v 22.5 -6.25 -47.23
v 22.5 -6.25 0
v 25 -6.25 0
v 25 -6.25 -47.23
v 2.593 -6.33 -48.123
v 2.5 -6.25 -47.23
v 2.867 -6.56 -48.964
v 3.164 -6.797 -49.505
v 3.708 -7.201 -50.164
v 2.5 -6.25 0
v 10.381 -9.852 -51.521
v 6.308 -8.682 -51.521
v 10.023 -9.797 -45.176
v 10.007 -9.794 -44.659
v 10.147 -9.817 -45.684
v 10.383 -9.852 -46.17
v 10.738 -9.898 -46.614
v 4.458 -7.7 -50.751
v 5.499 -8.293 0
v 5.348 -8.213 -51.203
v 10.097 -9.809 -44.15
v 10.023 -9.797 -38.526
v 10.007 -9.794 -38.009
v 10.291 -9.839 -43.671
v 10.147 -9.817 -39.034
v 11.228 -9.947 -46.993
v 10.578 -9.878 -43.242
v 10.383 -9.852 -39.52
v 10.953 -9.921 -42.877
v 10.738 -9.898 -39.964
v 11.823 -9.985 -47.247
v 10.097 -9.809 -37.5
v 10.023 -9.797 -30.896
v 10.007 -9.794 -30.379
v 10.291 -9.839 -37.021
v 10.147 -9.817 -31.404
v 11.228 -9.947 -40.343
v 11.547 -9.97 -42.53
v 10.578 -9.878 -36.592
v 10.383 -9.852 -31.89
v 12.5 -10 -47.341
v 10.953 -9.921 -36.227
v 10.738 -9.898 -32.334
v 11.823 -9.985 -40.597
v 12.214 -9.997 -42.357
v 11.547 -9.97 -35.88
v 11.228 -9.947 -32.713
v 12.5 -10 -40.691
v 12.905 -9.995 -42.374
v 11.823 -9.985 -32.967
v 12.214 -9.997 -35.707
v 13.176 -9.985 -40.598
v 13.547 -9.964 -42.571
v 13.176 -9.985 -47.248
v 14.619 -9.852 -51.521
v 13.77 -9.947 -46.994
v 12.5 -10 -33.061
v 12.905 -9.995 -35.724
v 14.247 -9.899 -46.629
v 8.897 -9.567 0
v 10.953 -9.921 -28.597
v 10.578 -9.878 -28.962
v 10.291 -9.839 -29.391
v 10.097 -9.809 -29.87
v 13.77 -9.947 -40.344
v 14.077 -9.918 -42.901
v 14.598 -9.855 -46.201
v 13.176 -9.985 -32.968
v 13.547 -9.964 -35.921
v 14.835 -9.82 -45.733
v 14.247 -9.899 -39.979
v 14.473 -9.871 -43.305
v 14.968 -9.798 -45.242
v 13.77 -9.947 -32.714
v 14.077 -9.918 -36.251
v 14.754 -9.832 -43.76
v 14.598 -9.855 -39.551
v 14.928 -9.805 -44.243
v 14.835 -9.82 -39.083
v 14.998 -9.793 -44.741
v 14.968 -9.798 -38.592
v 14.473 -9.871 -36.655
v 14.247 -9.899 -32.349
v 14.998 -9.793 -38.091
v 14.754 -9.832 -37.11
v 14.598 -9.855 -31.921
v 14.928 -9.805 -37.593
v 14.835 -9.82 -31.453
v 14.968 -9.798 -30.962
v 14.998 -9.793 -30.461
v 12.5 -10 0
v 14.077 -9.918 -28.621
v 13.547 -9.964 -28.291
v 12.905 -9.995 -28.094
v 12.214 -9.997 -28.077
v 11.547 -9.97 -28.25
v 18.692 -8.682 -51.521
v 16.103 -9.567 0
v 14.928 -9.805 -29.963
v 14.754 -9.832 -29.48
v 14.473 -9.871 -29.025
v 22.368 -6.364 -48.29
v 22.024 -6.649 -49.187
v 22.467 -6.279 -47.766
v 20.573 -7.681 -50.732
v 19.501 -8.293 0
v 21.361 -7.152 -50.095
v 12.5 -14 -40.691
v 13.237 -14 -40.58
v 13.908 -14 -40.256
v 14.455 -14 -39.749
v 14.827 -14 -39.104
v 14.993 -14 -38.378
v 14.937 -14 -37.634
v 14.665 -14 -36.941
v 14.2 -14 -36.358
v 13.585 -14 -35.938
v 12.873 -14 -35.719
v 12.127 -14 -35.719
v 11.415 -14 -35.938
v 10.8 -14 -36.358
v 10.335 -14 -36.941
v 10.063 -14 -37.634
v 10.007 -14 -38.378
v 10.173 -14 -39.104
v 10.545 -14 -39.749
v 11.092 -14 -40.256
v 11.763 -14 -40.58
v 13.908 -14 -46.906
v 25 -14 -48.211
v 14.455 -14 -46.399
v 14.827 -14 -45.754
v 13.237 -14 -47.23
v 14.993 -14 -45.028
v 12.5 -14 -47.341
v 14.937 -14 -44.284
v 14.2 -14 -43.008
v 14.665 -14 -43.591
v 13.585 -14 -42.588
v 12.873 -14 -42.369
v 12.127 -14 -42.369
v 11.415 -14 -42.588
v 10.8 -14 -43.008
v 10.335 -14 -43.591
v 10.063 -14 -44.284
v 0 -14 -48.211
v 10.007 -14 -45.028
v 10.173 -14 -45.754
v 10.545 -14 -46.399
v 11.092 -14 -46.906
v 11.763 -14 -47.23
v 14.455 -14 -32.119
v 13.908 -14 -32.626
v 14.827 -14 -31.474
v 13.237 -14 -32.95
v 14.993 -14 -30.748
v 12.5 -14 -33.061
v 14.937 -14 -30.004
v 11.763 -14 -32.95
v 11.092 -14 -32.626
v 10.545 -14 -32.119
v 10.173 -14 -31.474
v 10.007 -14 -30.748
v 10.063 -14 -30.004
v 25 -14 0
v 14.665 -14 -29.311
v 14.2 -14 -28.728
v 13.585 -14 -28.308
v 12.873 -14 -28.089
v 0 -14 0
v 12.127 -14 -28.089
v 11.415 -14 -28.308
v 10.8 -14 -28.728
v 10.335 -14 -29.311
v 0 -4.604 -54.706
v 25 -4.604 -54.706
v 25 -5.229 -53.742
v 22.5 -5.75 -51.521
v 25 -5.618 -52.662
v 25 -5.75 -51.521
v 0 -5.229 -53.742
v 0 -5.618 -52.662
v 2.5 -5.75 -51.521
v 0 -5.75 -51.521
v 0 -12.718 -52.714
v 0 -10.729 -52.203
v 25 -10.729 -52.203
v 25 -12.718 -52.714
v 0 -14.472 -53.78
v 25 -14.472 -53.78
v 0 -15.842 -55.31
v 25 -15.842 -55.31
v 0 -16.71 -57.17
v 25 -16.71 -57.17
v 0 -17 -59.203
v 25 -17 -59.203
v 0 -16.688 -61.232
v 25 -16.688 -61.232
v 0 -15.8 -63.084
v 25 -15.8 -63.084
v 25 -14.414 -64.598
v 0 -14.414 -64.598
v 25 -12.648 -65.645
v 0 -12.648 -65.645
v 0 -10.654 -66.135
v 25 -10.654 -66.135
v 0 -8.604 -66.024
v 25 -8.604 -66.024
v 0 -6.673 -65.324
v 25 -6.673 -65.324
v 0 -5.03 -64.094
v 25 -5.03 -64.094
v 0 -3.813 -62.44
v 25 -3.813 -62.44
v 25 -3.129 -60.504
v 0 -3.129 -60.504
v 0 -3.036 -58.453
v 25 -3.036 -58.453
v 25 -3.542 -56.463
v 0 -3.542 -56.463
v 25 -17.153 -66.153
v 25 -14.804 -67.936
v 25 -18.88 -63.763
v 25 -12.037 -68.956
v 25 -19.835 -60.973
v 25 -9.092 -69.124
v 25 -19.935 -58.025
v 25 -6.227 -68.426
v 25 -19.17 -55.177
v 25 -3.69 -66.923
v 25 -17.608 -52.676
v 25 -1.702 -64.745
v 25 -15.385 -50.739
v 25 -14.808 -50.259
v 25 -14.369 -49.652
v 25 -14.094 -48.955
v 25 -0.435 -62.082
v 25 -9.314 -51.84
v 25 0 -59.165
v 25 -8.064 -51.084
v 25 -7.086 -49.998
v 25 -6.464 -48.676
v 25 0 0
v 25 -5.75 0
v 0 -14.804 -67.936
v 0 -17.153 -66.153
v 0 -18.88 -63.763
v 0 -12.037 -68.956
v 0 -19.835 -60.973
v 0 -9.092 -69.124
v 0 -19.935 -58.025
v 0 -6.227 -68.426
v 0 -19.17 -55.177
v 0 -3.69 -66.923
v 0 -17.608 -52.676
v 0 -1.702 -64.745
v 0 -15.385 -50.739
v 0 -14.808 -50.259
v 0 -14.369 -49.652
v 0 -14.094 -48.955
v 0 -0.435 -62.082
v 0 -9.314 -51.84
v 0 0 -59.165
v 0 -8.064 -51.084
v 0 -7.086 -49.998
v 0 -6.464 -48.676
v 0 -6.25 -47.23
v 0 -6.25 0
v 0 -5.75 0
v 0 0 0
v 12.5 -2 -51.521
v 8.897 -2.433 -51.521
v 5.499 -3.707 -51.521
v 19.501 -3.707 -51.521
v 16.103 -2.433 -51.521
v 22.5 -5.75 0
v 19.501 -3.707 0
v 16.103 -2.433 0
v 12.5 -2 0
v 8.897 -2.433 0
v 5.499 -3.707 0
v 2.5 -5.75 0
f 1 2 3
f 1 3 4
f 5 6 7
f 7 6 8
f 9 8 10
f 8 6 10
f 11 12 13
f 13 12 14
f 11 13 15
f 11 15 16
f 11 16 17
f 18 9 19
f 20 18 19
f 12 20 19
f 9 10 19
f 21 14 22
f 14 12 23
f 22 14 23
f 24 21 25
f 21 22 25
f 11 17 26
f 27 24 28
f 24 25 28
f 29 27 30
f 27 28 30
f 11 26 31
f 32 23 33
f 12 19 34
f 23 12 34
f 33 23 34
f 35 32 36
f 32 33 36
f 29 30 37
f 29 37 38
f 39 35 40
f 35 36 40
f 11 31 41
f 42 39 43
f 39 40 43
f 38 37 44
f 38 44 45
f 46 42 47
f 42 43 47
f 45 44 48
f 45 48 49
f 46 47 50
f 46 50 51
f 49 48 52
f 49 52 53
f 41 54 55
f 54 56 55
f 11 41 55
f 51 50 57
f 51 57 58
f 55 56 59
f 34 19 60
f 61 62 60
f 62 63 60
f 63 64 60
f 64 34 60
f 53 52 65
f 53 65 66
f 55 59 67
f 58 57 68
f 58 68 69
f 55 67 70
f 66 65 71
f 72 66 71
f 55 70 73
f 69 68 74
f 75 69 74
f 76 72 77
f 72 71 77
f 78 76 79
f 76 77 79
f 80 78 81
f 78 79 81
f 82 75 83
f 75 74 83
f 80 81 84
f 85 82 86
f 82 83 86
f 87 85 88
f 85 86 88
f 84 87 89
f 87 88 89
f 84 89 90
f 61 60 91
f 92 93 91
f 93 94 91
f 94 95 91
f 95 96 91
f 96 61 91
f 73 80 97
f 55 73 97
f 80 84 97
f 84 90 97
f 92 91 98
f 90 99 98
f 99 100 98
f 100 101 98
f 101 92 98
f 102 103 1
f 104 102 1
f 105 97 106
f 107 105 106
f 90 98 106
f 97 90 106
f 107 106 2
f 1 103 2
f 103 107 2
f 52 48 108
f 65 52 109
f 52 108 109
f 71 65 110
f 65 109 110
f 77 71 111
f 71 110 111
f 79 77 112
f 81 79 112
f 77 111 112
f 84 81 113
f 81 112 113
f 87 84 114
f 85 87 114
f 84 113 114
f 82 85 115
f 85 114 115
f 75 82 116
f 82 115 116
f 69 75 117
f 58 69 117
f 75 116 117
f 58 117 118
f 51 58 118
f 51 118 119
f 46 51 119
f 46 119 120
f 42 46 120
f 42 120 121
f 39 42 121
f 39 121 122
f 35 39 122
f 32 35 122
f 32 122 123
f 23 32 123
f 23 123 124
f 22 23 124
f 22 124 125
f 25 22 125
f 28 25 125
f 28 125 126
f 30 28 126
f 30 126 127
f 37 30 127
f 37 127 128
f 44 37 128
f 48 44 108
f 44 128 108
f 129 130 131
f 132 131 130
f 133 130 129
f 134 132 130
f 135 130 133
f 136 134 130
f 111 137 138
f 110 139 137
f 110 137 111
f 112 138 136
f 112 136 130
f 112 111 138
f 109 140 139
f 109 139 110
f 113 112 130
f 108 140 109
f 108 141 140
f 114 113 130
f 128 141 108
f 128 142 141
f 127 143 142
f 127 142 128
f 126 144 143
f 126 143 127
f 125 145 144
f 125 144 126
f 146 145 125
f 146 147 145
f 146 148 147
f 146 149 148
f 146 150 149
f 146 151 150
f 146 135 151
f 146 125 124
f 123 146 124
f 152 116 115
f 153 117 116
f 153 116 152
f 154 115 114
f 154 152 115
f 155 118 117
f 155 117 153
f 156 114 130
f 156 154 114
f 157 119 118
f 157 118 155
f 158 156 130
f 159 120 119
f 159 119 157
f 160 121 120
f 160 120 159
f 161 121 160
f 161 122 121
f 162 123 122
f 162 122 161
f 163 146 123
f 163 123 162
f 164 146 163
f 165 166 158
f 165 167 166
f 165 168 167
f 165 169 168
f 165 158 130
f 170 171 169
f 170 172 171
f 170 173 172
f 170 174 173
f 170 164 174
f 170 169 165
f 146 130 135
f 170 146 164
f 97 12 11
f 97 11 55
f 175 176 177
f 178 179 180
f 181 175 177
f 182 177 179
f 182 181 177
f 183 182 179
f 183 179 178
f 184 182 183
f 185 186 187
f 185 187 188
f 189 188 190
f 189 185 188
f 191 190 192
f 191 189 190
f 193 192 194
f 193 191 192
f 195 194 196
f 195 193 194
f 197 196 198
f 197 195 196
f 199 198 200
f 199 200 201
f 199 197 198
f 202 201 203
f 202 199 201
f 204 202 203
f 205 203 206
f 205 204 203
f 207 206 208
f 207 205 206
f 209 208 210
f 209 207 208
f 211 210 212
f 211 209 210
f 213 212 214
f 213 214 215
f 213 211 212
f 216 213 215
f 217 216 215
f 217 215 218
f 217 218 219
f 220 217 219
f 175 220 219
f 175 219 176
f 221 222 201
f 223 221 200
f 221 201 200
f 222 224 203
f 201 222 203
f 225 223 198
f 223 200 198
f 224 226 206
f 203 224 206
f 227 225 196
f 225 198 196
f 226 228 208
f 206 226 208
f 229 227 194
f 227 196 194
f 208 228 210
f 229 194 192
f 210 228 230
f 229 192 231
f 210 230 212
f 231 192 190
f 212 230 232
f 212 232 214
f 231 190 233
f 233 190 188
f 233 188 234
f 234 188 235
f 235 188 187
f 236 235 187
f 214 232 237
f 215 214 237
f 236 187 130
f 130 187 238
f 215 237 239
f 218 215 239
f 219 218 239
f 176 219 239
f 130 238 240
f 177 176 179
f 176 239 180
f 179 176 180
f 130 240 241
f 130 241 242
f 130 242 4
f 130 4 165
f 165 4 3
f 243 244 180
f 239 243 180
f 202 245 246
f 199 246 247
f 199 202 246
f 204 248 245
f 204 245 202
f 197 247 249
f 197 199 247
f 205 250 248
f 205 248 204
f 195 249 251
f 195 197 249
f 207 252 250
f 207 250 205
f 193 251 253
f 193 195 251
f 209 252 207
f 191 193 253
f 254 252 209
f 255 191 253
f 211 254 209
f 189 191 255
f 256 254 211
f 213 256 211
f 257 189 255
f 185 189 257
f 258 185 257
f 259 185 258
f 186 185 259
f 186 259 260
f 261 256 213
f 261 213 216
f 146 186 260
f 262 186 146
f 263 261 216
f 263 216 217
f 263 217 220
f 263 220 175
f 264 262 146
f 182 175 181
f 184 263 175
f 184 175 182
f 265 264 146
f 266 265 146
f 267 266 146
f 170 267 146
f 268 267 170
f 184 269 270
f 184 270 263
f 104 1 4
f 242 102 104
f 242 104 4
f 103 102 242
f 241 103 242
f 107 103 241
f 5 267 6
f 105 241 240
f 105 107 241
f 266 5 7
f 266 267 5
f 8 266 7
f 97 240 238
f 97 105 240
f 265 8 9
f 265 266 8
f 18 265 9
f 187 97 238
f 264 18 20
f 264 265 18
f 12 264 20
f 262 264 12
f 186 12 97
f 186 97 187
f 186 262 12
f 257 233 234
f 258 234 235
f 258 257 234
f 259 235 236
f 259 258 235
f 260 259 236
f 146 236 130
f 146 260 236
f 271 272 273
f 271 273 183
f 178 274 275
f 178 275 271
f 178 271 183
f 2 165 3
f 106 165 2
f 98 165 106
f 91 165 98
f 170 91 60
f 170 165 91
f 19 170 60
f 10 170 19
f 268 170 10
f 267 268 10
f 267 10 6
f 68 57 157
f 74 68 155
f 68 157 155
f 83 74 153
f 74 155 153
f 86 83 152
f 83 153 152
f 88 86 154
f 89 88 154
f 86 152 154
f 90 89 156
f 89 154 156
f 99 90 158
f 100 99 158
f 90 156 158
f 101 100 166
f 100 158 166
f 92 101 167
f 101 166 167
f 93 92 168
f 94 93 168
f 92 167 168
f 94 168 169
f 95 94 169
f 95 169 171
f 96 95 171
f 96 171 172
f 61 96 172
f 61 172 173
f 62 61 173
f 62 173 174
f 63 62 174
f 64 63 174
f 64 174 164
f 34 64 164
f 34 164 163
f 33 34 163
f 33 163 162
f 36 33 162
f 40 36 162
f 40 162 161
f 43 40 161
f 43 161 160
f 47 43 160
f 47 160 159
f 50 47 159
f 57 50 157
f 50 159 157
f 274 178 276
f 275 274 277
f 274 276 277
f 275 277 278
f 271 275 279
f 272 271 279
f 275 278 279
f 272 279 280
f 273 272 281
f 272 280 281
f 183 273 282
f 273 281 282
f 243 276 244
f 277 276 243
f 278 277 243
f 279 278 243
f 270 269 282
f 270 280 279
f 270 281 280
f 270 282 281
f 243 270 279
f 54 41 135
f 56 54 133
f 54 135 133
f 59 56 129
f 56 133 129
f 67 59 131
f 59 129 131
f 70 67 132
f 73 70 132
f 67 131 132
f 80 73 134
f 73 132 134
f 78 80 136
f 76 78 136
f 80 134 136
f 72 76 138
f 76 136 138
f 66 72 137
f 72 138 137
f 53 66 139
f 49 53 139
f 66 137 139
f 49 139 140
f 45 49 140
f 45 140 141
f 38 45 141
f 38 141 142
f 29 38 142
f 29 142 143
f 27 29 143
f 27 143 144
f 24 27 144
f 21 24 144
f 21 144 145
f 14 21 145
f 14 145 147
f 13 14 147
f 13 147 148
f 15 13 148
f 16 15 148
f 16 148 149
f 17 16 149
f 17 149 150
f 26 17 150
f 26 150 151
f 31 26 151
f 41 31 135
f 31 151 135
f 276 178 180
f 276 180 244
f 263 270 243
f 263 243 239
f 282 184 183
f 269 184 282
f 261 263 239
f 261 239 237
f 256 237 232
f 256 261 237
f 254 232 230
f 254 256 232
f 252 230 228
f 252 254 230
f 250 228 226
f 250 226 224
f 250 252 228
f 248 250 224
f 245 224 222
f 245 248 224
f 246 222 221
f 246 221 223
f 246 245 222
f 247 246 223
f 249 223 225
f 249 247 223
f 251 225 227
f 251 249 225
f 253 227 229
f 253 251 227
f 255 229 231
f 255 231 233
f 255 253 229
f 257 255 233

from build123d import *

# Parameters (mm, degrees)
BOSS_EXTRUDE2_DEPTH = 25
CUT_EXTRUDE1_REACH  = 76.865
SKETCH5_R           = 2.5
CUT_EXTRUDE4_DEPTH  = 51.520709


with BuildPart() as part:
    # Sketch2 → Boss-Extrude2 (new body)
    with BuildSketch(Plane(origin=(0, 0, 0), x_dir=(0, 0, -1), z_dir=(1, 0, 0))):
        with BuildLine():
            Line((0, 0), (59.16515139, 0))
            ThreePointArc((59.16515139, 0), (67.935731583, -14.803844614), (50.738650505, -15.384615385))
            ThreePointArc((50.738650505, -15.384615385), (49.651853624, -14.368825942), (48.21070024, -14))
            Line((48.21070024, -14), (45, -14))
            Line((45, -14), (0, -14))
            Line((0, -14), (0, -6.25))
            Line((0, -6.25), (47.230433128, -6.25))
            ThreePointArc((47.230433128, -6.25), (50.576761962, -7.534884479), (52.203232404, -10.729166667))
            ThreePointArc((52.203232404, -10.729166667), (65.645099511, -12.64769189), (54.705893308, -4.604166667))
            ThreePointArc((54.705893308, -4.604166667), (53.213216965, -5.454829079), (51.520708964, -5.75))
            Line((51.520708964, -5.75), (0, -5.75))
            Line((0, -5.75), (0, 0))
        make_face()
    extrude(amount=BOSS_EXTRUDE2_DEPTH)

    # Sketch5 → Cut-Extrude1 (cut, up to next)
    with BuildSketch(Plane.XZ.offset(14), mode=Mode.PRIVATE) as cut_extrude1_sk1:
        with Locations(Location((12.5, -30.56070024, 0), (0, 0, 270))):
            Circle(SKETCH5_R)
    cut_extrude1_tool1 = extrude(cut_extrude1_sk1.sketch, amount=-CUT_EXTRUDE1_REACH, mode=Mode.PRIVATE) & part.part
    # Sketch5 → Cut-Extrude1 (cut, up to next)
    with BuildSketch(Plane.XZ.offset(14), mode=Mode.PRIVATE) as cut_extrude1_sk2:
        with Locations(Location((12.5, -38.19070024, 0), (0, 0, 270))):
            Circle(SKETCH5_R)
    cut_extrude1_tool2 = extrude(cut_extrude1_sk2.sketch, amount=-CUT_EXTRUDE1_REACH, mode=Mode.PRIVATE) & part.part
    # Sketch5 → Cut-Extrude1 (cut, up to next)
    with BuildSketch(Plane.XZ.offset(14), mode=Mode.PRIVATE) as cut_extrude1_sk3:
        with Locations(Location((12.5, -44.84070024, 0), (0, 0, 270))):
            Circle(SKETCH5_R)
    cut_extrude1_tool3 = extrude(cut_extrude1_sk3.sketch, amount=-CUT_EXTRUDE1_REACH, mode=Mode.PRIVATE) & part.part
    add(cut_extrude1_tool1.solids().sort_by_distance((12.5, -14, -30.5607))[0], mode=Mode.SUBTRACT)
    add(cut_extrude1_tool2.solids().sort_by_distance((12.5, -14, -38.1907))[0], mode=Mode.SUBTRACT)
    add(cut_extrude1_tool3.solids().sort_by_distance((12.5, -14, -44.8407))[0], mode=Mode.SUBTRACT)

    # Sketch7 → Cut-Extrude4 (cut)
    with BuildSketch(Plane.XY):
        with BuildLine():
            Line((22.5, -6.25), (22.5, -5.75))
            ThreePointArc((22.5, -5.75), (12.5, -2), (2.5, -5.75))
            Line((2.5, -5.75), (2.5, -6.25))
            ThreePointArc((2.5, -6.25), (12.5, -10), (22.5, -6.25))
        make_face()
    extrude(amount=-CUT_EXTRUDE4_DEPTH, mode=Mode.SUBTRACT)


solid = part.part
